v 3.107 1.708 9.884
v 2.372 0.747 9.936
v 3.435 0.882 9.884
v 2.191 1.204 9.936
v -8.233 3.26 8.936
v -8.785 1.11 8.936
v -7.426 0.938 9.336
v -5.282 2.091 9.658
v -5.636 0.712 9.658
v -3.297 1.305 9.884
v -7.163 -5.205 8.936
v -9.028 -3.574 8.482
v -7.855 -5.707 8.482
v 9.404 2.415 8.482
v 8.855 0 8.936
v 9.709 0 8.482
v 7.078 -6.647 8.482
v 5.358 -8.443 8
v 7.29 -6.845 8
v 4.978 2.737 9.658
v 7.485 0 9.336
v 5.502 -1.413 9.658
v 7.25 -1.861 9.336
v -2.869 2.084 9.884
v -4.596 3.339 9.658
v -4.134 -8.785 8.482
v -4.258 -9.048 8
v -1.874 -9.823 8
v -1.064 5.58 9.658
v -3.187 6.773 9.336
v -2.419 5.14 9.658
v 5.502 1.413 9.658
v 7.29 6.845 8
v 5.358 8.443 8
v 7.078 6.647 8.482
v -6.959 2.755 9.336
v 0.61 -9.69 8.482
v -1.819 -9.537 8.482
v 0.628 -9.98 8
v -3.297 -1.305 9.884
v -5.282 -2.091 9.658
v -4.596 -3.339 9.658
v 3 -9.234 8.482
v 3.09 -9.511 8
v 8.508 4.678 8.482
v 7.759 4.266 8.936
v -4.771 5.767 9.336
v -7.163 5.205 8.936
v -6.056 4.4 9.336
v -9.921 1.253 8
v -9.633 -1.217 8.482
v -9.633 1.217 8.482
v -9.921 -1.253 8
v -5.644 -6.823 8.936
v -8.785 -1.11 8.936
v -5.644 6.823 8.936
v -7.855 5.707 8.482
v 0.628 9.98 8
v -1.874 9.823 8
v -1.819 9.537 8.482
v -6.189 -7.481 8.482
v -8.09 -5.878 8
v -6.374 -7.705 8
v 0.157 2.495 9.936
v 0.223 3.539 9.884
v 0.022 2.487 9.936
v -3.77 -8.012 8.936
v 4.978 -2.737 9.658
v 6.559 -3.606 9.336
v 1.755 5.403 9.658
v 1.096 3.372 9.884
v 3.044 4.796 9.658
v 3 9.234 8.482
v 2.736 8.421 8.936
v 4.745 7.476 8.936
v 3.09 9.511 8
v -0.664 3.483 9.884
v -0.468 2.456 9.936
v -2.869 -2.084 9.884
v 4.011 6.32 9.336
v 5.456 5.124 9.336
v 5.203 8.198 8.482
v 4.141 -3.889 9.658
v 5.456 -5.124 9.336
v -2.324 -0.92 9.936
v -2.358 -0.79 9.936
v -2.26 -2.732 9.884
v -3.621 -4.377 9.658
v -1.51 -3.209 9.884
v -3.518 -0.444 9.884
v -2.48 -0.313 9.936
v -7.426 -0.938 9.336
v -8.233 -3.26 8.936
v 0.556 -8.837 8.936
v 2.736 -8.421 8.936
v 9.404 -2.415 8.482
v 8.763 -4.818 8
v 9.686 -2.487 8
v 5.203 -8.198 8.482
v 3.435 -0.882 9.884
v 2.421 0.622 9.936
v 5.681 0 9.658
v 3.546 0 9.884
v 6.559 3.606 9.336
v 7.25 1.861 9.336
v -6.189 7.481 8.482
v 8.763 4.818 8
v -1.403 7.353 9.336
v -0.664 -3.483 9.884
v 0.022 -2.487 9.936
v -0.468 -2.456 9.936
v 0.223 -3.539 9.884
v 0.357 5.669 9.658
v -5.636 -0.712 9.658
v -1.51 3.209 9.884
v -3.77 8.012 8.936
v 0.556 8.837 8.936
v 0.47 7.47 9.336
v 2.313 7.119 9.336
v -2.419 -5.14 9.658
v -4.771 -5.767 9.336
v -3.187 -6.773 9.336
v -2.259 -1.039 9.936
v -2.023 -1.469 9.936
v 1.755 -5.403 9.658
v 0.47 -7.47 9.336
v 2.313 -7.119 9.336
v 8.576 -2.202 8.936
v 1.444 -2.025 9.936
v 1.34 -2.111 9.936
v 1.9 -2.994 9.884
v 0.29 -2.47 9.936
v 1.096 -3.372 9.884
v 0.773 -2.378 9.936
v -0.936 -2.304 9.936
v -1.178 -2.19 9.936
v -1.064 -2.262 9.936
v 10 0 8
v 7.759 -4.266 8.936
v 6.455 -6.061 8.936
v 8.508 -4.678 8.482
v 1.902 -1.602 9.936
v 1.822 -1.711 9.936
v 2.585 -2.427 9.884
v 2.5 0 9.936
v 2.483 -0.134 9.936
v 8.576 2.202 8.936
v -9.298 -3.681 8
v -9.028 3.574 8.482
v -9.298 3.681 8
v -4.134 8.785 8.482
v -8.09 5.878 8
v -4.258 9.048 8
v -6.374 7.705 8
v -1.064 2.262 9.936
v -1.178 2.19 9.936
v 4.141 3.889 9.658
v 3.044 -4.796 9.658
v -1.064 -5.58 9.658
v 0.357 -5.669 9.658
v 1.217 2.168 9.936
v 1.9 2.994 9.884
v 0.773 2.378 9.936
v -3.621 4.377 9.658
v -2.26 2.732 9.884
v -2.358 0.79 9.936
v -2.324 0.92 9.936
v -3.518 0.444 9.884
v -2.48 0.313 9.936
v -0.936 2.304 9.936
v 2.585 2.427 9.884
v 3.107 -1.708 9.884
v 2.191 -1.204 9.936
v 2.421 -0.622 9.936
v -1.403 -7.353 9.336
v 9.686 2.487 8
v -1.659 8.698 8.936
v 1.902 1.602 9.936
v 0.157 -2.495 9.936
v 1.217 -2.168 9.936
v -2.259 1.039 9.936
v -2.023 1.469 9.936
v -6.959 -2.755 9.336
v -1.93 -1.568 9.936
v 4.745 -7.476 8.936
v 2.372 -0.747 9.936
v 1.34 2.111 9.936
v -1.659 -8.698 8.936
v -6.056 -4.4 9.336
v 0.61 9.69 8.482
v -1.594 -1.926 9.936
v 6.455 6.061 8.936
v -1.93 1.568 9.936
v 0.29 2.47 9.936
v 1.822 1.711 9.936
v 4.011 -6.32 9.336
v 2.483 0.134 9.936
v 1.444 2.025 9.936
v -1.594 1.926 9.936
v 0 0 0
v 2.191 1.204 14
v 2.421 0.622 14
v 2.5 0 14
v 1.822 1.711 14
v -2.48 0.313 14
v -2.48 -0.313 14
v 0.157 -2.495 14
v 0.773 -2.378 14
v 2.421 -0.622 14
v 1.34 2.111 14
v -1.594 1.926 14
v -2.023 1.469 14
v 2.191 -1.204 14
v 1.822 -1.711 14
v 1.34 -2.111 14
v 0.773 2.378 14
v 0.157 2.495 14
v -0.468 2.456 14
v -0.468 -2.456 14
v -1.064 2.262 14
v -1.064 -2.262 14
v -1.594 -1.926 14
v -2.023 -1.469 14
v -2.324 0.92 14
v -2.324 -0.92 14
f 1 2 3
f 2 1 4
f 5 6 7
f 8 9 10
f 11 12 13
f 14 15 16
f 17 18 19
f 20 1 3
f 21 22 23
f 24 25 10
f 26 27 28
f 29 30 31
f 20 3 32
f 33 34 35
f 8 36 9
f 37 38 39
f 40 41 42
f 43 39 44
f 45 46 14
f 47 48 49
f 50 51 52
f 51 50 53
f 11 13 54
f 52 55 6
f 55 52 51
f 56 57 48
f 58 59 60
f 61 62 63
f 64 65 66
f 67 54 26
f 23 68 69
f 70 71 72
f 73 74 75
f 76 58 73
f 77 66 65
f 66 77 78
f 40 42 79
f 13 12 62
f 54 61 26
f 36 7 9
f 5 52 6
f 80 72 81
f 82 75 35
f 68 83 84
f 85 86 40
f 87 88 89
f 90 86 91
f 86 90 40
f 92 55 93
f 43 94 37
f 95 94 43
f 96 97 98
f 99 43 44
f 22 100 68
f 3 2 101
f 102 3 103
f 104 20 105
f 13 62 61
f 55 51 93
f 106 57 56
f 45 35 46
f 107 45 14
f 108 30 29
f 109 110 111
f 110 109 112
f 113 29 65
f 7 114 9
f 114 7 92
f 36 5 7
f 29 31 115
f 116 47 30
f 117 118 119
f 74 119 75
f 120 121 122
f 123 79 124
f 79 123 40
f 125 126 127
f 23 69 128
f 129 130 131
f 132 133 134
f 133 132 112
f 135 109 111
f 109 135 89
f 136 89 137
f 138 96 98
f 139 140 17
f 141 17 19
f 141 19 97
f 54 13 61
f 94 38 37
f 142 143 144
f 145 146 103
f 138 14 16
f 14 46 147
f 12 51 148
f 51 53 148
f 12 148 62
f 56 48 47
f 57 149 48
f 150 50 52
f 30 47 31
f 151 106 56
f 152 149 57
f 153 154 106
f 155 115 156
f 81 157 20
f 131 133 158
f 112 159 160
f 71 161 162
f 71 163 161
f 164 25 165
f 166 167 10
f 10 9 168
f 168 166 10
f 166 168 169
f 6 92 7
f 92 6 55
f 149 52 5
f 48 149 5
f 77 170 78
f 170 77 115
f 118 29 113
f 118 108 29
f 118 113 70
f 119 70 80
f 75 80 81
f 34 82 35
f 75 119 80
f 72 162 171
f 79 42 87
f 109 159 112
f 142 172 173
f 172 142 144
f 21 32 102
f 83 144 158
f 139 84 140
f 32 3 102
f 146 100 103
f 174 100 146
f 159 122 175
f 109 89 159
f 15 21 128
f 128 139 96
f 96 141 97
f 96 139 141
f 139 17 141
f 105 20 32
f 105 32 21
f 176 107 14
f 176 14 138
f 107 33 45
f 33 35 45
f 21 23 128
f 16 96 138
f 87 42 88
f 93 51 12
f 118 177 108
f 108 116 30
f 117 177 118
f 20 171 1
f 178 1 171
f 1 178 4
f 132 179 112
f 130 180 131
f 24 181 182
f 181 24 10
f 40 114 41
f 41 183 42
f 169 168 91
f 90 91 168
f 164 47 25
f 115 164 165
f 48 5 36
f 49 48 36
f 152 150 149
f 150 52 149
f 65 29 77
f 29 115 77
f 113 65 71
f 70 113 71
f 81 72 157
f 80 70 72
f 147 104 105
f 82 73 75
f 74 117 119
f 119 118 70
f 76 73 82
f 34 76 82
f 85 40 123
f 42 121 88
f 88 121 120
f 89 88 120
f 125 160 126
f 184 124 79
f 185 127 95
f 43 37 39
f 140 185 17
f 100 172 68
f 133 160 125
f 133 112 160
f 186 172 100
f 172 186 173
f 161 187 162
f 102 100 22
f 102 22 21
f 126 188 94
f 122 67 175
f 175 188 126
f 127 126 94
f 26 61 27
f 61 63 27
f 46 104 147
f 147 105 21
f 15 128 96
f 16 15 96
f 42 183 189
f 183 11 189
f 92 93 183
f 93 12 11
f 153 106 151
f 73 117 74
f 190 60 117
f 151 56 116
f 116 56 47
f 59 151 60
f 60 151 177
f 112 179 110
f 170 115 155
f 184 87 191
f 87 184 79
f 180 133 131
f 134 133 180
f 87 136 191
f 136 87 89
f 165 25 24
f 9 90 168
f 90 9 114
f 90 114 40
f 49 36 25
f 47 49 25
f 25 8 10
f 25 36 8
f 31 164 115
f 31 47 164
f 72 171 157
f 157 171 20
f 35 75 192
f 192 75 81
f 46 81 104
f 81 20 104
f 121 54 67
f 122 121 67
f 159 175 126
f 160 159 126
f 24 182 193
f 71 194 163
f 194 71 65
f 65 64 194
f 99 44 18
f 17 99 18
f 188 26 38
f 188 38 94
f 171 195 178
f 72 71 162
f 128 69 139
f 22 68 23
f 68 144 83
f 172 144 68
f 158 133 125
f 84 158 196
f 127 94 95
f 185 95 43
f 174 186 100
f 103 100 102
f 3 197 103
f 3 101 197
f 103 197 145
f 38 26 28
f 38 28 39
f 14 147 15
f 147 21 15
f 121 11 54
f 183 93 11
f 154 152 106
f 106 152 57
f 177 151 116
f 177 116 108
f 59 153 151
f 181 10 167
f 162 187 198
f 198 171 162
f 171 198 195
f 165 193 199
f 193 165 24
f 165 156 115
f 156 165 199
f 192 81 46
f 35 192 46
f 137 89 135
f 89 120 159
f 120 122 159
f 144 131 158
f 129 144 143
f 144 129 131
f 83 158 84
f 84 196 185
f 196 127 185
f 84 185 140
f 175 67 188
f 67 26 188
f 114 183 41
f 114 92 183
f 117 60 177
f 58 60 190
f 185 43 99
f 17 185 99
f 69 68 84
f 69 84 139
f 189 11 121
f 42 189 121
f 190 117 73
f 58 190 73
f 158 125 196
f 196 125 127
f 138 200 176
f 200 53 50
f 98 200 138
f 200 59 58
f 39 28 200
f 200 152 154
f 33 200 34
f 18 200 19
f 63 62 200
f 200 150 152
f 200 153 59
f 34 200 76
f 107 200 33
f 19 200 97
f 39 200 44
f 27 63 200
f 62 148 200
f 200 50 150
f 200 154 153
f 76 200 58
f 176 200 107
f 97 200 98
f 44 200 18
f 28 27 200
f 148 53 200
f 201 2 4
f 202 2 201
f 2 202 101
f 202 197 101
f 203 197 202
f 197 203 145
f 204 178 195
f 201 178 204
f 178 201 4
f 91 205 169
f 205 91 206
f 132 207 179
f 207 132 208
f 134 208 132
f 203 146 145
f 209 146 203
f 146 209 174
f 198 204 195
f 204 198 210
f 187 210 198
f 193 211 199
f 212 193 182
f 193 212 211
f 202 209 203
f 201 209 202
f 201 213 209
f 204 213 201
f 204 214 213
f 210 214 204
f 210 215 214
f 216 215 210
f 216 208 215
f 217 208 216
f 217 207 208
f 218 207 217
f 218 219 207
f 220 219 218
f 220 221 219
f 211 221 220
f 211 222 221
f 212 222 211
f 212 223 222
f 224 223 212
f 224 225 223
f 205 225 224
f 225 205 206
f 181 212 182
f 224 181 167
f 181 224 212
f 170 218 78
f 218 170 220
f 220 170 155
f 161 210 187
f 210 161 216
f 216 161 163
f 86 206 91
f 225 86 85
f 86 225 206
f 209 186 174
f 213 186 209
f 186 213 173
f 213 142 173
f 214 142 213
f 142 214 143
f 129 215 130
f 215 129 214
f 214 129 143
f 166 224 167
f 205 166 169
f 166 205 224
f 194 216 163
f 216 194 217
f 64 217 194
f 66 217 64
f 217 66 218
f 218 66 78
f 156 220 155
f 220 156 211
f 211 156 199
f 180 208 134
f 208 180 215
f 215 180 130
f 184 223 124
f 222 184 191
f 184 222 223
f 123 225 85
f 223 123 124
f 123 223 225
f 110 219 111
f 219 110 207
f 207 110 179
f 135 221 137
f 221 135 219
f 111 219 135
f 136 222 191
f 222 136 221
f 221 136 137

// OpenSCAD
union() {
	$fn=25;
	$width=20;
	$bottom_cone_height=8;
	$rounded_top_height=2;
	$handle_height=4;
	union() {
		cylinder(h=$bottom_cone_height, d1=0, d2=$width);
		translate([0, 0, $bottom_cone_height])
			resize([0, 0, $rounded_top_height])
				difference() {
					sphere(d=$width);
					translate([0, 0, -$width/2-1])
						cylinder(h=$width/2+1, d=$width+2);
					}
		translate([0, 0, $bottom_cone_height])
			cylinder(h=$rounded_top_height+$handle_height, d=5);
	}
}
